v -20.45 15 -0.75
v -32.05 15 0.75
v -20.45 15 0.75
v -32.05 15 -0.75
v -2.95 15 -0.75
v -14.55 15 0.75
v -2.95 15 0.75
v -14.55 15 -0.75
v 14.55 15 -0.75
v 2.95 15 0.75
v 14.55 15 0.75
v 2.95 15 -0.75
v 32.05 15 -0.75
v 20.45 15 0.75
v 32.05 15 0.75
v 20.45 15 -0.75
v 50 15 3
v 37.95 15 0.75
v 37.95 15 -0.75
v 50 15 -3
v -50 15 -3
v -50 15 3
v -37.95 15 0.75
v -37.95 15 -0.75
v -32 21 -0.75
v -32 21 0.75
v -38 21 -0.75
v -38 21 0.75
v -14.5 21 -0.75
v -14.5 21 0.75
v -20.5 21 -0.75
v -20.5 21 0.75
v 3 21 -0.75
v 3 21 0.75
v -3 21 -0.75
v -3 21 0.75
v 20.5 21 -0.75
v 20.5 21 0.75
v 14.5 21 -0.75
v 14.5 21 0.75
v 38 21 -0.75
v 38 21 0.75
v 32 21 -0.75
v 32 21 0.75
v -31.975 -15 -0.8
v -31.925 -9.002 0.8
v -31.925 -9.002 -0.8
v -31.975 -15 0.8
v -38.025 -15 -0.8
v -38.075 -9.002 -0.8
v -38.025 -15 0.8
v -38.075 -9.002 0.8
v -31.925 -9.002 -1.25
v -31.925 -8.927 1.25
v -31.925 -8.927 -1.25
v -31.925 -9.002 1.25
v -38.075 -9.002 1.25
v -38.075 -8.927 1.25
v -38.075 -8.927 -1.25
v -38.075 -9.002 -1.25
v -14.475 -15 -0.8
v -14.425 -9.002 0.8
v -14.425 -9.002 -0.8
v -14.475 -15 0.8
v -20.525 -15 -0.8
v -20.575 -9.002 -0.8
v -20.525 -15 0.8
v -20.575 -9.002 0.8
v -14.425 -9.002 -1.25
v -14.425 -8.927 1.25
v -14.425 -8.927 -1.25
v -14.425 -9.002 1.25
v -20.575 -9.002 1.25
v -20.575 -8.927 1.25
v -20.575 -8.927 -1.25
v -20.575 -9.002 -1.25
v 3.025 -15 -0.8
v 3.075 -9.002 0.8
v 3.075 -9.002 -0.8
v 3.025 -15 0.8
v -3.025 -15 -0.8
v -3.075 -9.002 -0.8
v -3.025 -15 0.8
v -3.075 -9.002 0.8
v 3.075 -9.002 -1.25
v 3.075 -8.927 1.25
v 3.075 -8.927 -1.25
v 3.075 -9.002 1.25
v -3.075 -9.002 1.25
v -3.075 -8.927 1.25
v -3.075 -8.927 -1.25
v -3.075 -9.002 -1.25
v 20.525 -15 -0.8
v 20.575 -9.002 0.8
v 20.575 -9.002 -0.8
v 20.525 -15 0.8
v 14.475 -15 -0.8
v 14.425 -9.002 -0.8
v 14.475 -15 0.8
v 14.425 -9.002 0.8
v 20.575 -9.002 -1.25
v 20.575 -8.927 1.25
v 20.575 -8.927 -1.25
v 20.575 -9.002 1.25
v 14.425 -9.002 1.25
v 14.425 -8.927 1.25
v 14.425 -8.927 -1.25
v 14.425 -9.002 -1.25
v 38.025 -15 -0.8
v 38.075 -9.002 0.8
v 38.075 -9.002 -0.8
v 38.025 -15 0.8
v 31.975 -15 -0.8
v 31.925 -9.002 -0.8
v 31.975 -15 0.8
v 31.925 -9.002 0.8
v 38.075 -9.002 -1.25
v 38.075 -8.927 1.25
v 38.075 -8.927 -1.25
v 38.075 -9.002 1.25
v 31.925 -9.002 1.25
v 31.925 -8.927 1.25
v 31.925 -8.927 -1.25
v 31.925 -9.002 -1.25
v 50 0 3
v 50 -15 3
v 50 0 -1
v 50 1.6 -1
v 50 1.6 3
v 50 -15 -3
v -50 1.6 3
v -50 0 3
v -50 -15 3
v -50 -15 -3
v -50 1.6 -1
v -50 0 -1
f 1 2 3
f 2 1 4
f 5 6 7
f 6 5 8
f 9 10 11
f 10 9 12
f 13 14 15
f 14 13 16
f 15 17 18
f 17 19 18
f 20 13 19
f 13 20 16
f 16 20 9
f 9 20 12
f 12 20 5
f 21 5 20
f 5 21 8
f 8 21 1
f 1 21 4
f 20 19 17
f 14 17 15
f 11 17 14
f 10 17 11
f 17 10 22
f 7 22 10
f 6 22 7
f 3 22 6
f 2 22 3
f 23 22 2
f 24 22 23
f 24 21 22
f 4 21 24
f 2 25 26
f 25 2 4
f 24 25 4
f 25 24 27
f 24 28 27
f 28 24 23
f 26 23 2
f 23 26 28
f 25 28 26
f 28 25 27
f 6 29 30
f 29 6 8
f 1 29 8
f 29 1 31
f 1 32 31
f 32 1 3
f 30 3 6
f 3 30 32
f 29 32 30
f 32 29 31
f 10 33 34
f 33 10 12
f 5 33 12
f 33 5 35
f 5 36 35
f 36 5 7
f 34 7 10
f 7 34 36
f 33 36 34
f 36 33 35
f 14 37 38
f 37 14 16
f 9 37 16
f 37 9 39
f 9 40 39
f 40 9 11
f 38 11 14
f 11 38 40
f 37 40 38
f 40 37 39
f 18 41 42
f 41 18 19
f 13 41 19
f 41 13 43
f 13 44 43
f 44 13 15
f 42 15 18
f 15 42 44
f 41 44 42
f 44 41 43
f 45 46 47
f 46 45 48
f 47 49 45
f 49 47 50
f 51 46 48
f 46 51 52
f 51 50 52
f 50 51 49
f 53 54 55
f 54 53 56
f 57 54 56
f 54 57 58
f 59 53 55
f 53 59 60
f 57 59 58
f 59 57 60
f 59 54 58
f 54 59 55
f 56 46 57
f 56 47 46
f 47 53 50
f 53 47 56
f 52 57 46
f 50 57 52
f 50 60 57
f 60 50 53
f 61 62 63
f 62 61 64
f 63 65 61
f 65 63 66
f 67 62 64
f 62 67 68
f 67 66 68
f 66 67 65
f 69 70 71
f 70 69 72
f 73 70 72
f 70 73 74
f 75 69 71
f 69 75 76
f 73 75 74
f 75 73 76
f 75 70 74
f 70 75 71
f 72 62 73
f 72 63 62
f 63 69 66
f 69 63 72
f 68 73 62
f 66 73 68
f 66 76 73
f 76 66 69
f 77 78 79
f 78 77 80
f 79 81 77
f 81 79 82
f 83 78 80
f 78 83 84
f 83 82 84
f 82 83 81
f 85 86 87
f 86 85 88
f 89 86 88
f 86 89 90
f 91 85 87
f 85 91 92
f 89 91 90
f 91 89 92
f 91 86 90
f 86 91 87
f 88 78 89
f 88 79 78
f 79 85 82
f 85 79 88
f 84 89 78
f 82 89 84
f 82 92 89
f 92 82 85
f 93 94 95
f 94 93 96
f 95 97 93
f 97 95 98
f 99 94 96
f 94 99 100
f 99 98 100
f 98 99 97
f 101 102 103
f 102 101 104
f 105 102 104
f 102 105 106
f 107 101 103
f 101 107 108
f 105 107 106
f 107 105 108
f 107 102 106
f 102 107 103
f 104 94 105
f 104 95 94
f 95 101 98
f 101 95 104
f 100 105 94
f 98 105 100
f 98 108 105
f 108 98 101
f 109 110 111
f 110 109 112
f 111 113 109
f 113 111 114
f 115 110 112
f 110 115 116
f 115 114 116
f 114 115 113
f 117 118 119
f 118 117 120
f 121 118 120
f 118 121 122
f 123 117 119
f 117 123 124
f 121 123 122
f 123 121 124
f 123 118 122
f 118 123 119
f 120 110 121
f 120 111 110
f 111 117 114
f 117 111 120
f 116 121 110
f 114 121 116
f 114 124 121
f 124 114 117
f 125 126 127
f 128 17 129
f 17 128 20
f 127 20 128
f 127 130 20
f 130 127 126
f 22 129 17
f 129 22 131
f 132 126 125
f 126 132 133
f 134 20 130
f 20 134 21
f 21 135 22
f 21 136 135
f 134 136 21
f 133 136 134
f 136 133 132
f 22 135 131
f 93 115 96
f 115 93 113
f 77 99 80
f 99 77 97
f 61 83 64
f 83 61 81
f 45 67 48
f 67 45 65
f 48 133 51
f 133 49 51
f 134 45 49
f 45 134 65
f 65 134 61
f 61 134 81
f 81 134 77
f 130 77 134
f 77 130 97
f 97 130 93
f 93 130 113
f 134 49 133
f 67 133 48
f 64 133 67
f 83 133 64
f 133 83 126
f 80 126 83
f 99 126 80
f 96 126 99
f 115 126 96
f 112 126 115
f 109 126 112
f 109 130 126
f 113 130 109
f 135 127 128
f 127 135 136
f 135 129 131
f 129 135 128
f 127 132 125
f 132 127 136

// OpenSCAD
// file: dovetail.scad
//male_dovetail(max_width=11, min_width=5, depth=5, height=30, cutout_width=5, cutout_depth=3.5)
//This produces a male dovetail with the dimensions specified. The cutout_width and depth specify the dimensions of a cutout in the center of the dovetail that will hopefully provide some spring or flex to allow them to go together tightly.
//
//female_dovetail((max_width=11, min_width=5, depth=5, height=30, block_width=15, block_depth=9, clearance=0.25)
//This produces a block of the specified dimensions with a dovetail cut out of it with an added clearance on three sides.
//
//female_dovetail_negative(max_width=11, min_width=5, depth=5, height=30, clearance=0.25)
//This produces the negative of the above module so that you can subtract it from an object.


module female_dovetail_negative(max_width=11, min_width=5, depth=5, height=30, clearance=0.25) {
	union() {
		translate([0,-0.001,-0.05])
			dovetail_3d(max_width+clearance,min_width+clearance,depth,height+0.1);
			translate([-(max_width+clearance)/2, depth-0.002,-0.5])
				cube([max_width+clearance,clearance/2,height+1]);
	}
}

module female_dovetail(max_width=11, min_width=5, depth=5, height=30, block_width=15, block_depth=9, clearance=0.25) {
		difference() {
			translate([-block_width/2,0,0]) cube([block_width, block_depth, height]);
			female_dovetail_negative(max_width, min_width, depth, height, clearance);
		}
}

module male_dovetail(max_width=11, min_width=51, depth=5, height=30, cutout_width=5, cutout_depth=3.5) {
	difference() {
		dovetail_3d(max_width,min_width,depth,height);
		translate([0.001,depth+0.001,-0.05])
			dovetail_cutout(cutout_width, cutout_depth, height+0.1);
	}
}

module dovetail_3d(max_width=11, min_width=5, depth=5, height=30) {
	linear_extrude(height=height, convexity=2)
		dovetail_2d(max_width,min_width,depth);
}

module dovetail_2d(max_width=11, min_width=5, depth=5) {
	angle=atan((max_width/2-min_width/2)/depth);
	echo("angle: ", angle);
	polygon(paths=[[0,1,2,3,0]], points=[[-min_width/2,0], [-max_width/2,depth], [max_width/2, depth], [min_width/2,0]]);
}

module dovetail_cutout(width=5, depth=4, height=30) {
	translate([0,-depth+width/2,0])
		union() {
			translate([-width/2,0,0])
				cube([width,depth-width/2,height]);
			difference() {
				cylinder(r=width/2, h=height, $fs=0.25);
				translate([-width/2-0.05,0.05,-0.05]) cube([width+0.1,width+0.1,height+0.1]);
			}
		}
}
// main file
include <dovetail.scad>;
pcb_length = 100;
pcb_thickness = 1.6;

width = 30;
height = 6;
length = 100;


module _right_triangle(side1,side2,corner_radius,triangle_height){
    rotate([0,270,0])
    translate([corner_radius,corner_radius,0]){  
        hull(){  
            translate([0,0,-triangle_height]) cylinder(r=corner_radius,h=triangle_height*4,$fn=10);
            translate([side1 - corner_radius * 2,0,triangle_height/2])cylinder(r=corner_radius*2,h=triangle_height,$fn=10);
            translate([0,side2 - corner_radius * 2])cylinder(r=corner_radius,h=triangle_height*2,$fn=10);  
        }
    }
}
module right_triangle() {
    translate([1.3,0,0])
    difference() {
        _right_triangle(4,5,0.3,1.3);
        translate([-0.3,0.5,0])
        _right_triangle(3,4,0.3,1);
    }
}
module negocinho_que_segura() {
    translate([0,0.3,height/2-0.6])
    minkowski(){
        right_triangle();
        sphere(0.3);
    }
}


// temp variables
min_width = 5.9;
max_width = 6;
depth = 6;
number_of_joints = 5; // needs to be odd
number_of_supports = floor(number_of_joints/2);
spacing_between_joints = (length - (max_width * number_of_joints))/(number_of_joints-1);

difference() {
    union() {
//        for (i = [-2:+2]) {
        for (i = [-number_of_supports:number_of_supports]) {
            translate([i*spacing_between_joints,0,height/2-height/8])
            union() {
                translate([0,width/2,-height/2])
                male_dovetail(max_width=max_width, min_width=min_width, depth=depth, 
                height=height/4, cutout_width=0, cutout_depth=0);
            }
        }
        difference() {
            cube([length, width, height], center=true);
            for (i = [-number_of_supports:number_of_supports]) {
                translate([i*spacing_between_joints,-(width/2),-height/2+height/2-height/8])
                female_dovetail_negative(max_width, min_width, depth, height/4, 0.15);
            }
        }
    }
    translate([-length/2,0,-1])
    cube([pcb_length, pcb_thickness, height/2+2]);
};
//translate([30,pcb_thickness,0])
//negocinho_que_segura();
//translate([-10,pcb_thickness,0])
//negocinho_que_segura();
//
//mirror([0,1,0]) {
//    translate([30,0,0])
//    negocinho_que_segura();
//    translate([-10,0,0])
//    negocinho_que_segura();
//}
